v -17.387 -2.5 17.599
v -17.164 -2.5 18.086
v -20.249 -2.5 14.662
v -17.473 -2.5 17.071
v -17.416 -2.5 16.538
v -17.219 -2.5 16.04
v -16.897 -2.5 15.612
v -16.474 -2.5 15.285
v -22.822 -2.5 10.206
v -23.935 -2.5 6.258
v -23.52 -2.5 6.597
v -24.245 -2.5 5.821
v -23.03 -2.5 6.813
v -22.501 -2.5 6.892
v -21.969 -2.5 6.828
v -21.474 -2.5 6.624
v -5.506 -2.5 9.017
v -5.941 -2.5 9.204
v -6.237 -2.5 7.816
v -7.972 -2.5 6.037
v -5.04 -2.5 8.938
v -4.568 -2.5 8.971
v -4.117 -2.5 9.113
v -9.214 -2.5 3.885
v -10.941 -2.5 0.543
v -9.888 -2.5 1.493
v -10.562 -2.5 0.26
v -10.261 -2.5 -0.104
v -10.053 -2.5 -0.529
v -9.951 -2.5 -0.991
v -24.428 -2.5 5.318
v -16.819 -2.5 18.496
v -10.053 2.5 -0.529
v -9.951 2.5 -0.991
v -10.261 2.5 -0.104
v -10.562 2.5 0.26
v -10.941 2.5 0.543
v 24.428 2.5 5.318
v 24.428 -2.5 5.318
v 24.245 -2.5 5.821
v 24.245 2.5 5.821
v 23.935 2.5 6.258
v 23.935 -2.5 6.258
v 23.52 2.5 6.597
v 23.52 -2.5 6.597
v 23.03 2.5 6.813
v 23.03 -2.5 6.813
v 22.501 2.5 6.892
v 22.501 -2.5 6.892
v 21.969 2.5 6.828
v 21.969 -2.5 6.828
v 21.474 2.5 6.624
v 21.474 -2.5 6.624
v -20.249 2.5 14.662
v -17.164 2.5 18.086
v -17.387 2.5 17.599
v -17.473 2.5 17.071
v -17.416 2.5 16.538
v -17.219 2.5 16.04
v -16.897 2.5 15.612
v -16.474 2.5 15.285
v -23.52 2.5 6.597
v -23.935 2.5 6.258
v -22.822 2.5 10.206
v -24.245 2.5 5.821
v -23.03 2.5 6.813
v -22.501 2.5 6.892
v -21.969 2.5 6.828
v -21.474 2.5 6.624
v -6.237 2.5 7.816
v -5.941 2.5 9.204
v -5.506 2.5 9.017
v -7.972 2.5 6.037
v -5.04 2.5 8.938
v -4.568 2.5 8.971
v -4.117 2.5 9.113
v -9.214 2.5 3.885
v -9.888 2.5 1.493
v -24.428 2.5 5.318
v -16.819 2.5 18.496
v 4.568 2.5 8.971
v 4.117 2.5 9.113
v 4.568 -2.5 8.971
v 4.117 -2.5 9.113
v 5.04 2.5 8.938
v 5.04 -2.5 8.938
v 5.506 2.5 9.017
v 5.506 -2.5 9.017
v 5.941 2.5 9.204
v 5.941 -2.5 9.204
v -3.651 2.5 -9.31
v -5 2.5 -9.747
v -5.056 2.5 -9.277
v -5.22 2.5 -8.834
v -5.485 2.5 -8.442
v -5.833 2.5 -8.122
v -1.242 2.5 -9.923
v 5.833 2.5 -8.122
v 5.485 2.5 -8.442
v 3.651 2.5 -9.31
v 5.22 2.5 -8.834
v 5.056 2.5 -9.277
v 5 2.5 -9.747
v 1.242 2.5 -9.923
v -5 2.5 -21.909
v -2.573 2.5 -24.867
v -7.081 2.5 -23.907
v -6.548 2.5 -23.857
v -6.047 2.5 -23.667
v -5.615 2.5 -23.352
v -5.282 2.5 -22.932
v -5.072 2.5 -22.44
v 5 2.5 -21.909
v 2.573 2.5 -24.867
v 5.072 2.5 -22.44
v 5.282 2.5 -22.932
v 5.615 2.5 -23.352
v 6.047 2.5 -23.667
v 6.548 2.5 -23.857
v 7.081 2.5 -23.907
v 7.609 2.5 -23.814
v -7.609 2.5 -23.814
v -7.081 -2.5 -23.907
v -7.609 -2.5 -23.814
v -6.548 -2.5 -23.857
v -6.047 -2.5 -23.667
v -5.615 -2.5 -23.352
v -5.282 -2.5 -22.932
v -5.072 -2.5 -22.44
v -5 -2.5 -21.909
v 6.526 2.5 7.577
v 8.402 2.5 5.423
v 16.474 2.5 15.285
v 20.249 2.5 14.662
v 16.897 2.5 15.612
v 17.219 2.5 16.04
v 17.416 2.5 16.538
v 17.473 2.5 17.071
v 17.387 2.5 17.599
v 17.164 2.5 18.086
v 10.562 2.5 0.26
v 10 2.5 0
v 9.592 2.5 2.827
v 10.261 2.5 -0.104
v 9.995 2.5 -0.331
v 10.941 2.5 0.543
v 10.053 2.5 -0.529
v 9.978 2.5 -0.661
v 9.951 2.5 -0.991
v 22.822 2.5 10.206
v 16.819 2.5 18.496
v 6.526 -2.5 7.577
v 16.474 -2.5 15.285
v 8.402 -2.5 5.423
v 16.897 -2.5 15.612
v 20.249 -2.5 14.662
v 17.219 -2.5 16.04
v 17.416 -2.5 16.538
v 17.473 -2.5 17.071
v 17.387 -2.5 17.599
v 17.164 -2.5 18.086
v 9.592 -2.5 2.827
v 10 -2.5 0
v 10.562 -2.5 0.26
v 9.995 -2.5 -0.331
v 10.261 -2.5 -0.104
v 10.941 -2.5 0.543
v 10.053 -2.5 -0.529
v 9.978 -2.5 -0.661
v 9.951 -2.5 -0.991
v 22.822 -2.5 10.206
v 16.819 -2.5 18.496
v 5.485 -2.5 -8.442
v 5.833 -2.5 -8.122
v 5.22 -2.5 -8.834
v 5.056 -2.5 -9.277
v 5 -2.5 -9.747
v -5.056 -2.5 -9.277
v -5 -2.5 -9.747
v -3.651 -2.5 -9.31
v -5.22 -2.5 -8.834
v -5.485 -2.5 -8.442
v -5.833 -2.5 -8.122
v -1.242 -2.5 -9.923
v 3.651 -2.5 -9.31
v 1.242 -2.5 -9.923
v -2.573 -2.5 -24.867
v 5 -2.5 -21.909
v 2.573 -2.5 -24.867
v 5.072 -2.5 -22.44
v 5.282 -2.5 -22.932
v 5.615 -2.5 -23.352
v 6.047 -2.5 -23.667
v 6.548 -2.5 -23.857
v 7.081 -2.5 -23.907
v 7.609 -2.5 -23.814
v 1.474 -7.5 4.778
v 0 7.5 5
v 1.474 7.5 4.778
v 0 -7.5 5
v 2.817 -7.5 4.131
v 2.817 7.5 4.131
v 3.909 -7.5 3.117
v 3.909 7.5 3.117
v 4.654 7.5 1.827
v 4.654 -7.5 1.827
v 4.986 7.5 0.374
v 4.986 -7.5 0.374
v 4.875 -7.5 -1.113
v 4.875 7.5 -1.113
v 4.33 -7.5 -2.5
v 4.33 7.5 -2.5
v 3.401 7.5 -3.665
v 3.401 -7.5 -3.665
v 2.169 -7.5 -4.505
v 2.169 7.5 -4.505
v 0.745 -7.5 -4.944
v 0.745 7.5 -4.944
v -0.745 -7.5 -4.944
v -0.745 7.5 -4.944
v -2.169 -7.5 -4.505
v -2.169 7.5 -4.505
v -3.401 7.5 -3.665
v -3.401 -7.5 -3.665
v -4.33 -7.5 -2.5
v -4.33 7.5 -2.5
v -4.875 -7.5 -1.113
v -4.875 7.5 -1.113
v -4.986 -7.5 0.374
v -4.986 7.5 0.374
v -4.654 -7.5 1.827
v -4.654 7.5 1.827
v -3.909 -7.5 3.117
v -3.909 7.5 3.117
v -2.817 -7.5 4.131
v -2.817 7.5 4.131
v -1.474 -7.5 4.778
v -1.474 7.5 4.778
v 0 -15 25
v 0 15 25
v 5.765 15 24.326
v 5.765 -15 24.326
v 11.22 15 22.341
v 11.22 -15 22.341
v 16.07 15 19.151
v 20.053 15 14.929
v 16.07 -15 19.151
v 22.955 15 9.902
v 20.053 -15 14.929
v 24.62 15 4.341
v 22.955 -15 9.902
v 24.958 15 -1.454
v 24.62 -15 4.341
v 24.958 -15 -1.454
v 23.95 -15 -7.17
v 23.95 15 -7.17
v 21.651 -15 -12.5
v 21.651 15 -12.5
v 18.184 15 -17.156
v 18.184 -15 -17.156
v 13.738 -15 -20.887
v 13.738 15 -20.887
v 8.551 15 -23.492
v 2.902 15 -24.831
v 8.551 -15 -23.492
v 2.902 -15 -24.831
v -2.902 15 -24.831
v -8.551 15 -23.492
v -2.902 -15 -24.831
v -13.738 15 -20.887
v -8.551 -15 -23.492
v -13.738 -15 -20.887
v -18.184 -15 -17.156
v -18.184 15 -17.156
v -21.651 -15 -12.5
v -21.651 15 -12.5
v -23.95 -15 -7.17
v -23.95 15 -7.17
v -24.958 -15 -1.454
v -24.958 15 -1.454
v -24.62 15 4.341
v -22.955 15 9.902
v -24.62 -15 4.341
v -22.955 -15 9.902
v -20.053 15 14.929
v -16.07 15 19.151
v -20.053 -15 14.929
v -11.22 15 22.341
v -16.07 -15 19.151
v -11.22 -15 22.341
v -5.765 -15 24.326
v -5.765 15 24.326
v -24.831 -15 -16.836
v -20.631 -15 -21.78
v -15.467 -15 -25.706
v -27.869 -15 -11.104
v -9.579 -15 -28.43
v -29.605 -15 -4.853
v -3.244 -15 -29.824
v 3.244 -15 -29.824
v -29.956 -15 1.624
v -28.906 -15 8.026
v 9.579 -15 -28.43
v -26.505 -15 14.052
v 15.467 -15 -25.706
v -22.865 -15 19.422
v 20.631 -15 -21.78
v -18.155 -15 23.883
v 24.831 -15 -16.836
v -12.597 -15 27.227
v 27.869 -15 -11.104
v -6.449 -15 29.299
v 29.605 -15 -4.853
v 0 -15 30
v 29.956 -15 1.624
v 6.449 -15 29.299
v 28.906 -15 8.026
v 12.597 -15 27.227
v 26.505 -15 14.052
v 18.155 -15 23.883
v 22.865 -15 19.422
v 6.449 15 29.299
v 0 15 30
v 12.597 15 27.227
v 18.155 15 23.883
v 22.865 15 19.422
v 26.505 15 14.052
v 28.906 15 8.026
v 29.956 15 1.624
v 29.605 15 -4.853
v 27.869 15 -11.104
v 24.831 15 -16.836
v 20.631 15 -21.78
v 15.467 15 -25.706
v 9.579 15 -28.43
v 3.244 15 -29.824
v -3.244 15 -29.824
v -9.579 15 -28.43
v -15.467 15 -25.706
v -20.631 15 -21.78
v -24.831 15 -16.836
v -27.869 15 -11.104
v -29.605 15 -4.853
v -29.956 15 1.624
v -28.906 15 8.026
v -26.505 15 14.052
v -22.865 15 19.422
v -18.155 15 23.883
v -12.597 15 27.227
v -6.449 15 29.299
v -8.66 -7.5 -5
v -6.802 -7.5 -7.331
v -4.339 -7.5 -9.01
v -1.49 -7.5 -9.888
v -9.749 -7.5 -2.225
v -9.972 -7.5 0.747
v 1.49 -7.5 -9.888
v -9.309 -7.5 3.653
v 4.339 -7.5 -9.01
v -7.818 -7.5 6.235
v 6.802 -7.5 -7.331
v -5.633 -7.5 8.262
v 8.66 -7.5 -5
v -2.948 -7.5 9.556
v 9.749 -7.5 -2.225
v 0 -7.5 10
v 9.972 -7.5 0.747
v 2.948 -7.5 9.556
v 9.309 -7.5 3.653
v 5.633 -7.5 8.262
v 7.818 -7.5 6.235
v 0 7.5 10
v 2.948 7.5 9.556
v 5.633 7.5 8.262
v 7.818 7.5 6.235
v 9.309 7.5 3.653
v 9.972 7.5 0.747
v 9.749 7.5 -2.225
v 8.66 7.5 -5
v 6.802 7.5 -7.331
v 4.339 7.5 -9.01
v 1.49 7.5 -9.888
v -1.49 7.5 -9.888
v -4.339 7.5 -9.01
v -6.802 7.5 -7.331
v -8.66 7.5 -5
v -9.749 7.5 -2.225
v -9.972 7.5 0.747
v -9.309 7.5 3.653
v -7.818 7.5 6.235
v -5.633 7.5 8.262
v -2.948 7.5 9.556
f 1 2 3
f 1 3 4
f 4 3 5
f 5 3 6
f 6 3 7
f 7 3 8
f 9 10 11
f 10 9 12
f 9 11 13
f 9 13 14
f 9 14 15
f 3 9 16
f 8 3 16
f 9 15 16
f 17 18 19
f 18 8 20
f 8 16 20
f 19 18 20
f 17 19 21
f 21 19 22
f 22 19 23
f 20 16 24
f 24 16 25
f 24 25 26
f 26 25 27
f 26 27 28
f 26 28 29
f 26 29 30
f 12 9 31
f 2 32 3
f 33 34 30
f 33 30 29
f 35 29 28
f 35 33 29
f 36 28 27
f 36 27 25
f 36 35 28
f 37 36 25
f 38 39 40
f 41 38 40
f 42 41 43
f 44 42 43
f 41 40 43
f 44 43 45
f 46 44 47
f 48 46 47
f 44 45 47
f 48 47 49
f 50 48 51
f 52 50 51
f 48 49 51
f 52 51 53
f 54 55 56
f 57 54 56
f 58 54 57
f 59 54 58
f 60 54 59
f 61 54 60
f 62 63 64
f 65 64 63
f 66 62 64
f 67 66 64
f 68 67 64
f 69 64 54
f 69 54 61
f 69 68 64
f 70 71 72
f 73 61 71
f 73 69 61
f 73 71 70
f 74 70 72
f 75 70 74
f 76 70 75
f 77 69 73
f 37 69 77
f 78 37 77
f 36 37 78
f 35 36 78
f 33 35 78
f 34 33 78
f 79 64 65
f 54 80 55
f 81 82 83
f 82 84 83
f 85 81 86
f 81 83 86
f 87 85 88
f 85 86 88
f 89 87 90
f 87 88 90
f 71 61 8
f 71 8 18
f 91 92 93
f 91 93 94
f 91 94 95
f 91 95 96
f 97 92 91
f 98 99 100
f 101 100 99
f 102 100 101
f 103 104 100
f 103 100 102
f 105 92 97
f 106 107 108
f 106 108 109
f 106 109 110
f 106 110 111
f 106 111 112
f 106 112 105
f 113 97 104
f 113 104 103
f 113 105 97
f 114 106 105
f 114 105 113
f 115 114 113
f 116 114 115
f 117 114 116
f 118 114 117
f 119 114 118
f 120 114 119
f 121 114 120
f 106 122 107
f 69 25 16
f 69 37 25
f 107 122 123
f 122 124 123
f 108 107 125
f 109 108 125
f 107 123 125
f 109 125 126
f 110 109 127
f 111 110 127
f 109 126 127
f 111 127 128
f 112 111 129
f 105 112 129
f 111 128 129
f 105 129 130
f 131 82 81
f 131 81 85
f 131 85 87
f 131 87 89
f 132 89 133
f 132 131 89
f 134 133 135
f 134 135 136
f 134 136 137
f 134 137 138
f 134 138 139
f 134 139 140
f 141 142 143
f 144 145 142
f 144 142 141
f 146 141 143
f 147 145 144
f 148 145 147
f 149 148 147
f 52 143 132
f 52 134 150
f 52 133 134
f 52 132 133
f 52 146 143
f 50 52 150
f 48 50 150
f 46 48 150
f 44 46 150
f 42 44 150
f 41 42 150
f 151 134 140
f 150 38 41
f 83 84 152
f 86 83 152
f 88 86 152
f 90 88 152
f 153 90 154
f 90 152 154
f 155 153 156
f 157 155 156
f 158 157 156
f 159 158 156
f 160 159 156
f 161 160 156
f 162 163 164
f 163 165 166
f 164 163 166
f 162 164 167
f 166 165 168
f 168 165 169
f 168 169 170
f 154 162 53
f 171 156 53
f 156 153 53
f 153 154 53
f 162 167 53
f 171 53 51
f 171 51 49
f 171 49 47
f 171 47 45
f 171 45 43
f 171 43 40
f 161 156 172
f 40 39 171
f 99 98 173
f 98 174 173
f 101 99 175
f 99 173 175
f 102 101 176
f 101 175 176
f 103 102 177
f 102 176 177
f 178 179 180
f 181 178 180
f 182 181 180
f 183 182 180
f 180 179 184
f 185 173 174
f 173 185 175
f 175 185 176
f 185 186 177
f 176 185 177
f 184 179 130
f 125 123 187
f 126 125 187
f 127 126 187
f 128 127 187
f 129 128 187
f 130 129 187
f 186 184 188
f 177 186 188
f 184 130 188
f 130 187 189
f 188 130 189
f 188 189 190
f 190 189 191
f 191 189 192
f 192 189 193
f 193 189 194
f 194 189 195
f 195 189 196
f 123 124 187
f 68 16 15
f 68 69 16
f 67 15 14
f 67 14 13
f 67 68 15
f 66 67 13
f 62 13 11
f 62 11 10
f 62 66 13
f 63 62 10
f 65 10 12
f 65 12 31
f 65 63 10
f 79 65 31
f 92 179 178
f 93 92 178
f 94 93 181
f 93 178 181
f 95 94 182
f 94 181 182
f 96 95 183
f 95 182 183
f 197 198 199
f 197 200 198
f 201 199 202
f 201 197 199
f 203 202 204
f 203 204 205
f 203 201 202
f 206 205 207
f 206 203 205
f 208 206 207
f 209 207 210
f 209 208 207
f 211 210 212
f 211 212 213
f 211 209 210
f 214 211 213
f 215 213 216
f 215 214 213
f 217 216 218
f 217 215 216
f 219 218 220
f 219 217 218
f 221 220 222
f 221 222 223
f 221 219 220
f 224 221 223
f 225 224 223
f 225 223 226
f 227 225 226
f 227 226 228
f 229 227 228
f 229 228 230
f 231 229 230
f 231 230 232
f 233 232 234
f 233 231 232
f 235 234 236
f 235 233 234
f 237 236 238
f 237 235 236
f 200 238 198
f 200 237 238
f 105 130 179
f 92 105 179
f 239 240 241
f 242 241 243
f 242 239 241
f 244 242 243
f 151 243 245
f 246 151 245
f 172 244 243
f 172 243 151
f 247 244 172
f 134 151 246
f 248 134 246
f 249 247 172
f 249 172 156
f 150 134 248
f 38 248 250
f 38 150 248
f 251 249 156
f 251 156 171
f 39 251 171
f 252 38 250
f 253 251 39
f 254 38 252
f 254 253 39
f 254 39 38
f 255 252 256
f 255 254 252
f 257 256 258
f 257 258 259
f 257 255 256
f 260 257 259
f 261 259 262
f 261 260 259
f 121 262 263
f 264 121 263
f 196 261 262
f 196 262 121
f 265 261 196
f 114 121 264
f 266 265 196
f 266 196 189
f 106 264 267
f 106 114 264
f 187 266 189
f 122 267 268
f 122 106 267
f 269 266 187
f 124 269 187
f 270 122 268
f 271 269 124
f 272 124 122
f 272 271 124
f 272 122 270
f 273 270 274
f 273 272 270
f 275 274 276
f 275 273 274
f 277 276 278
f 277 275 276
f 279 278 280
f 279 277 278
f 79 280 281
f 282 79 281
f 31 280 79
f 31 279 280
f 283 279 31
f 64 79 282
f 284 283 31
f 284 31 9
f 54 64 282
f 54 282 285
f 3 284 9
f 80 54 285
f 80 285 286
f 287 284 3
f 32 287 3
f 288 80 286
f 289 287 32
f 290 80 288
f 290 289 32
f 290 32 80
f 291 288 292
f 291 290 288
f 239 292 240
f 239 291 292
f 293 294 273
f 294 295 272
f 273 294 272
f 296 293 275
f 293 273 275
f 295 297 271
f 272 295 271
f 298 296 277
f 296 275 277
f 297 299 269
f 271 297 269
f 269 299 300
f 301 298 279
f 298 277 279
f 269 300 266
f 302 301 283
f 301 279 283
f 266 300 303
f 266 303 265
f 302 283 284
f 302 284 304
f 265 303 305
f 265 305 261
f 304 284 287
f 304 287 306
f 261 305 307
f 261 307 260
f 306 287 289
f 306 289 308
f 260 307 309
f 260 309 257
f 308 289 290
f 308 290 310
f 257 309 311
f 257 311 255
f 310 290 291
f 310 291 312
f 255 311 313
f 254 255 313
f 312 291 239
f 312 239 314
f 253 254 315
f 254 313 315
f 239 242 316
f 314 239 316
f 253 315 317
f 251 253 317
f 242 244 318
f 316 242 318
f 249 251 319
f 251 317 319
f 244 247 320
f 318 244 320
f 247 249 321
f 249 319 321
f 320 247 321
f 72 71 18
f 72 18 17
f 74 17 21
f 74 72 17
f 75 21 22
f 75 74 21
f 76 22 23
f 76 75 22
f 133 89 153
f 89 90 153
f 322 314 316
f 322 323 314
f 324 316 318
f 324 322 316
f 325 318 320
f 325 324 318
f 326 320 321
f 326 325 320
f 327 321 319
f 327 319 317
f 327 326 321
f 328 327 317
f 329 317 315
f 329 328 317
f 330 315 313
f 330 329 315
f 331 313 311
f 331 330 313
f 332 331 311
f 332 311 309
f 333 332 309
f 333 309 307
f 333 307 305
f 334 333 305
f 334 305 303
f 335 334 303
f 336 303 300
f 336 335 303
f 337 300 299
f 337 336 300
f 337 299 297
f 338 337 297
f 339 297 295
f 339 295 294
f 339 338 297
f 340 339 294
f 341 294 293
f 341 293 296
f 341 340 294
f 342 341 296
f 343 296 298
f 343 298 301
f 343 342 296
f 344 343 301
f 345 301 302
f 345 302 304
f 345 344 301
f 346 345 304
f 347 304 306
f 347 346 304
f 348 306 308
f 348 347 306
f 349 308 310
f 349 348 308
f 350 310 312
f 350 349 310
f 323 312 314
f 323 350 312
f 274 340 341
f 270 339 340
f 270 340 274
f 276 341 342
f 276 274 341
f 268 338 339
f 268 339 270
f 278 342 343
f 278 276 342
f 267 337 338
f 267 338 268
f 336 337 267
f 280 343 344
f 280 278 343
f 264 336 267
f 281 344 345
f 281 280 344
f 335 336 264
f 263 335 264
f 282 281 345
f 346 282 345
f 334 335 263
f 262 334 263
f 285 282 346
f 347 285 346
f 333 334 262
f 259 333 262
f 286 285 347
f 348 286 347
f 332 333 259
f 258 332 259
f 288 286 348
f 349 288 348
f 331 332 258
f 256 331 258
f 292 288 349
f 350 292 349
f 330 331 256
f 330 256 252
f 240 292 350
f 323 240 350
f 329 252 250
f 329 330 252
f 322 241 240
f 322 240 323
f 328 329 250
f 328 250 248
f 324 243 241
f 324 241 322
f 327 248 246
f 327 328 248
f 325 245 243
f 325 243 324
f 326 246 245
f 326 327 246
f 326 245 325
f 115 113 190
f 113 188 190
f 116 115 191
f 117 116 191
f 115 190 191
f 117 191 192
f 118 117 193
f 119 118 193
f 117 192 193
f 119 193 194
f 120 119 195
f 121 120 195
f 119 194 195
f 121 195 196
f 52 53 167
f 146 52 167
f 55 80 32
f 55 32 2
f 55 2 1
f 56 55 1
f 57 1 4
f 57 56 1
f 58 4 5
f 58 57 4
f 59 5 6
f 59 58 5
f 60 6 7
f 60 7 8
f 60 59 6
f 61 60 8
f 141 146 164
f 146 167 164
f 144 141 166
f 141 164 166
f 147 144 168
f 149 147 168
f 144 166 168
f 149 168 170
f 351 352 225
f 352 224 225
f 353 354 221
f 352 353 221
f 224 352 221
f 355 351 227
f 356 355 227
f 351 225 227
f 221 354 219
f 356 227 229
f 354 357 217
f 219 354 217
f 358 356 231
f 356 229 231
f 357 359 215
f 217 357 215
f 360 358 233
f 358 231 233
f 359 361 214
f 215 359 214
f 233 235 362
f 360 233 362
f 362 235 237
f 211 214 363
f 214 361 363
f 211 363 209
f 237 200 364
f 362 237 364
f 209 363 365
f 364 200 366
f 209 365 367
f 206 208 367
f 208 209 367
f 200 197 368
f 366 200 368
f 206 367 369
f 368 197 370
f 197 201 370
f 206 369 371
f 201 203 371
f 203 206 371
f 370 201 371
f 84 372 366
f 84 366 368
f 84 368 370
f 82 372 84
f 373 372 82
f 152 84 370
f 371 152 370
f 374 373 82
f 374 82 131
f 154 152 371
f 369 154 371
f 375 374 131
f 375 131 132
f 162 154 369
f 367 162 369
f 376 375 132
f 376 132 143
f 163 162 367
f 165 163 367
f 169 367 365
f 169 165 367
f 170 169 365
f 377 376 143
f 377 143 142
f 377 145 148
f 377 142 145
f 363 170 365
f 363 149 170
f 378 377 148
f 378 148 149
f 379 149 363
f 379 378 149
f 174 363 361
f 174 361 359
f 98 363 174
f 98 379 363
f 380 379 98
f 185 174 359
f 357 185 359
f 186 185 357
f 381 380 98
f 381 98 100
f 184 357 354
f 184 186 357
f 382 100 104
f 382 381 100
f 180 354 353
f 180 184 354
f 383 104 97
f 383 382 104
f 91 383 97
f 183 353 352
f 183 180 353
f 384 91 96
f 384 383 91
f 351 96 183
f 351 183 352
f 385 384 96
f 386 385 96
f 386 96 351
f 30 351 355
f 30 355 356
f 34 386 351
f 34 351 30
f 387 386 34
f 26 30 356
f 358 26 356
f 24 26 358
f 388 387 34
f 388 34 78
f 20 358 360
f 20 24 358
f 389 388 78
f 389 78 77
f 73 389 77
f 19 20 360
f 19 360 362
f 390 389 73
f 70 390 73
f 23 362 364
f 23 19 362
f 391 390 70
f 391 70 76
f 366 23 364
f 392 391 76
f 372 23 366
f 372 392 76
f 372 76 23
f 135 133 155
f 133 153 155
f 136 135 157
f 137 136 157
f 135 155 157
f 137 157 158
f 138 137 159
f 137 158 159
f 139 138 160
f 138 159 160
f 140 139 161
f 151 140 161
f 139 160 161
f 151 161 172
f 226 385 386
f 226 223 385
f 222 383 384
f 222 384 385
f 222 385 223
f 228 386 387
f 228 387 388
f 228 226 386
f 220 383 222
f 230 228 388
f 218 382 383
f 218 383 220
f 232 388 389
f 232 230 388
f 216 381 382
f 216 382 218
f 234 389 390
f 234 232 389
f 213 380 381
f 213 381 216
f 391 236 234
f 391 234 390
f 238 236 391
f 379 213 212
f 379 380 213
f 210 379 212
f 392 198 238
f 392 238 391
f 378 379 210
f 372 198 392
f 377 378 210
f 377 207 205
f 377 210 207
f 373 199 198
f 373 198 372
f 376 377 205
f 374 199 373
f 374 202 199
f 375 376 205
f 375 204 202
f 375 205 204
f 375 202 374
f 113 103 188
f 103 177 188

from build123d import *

# Parameters (mm, degrees)
SKETCH1_R           = 30
BOSS_EXTRUDE1_DEPTH = 15
SKETCH1_3_R         = 5
BOSS_EXTRUDE2_DEPTH = 7.5
BOSS_EXTRUDE3_DEPTH = 2.5


with BuildPart() as part:
    # Sketch1 → Boss-Extrude1 (new, symmetric)
    with BuildSketch(Plane(origin=(0, 0, 0), x_dir=(1, 0, 0), z_dir=(0, 1, 0))):
        Circle(SKETCH1_R)
        with BuildLine():
            ThreePointArc((25, 0), (24.856562962, -2.674187298), (24.427897784, -5.317688395))
            ThreePointArc((24.427897784, -5.317688395), (21.650635095, -12.5), (16.819202132, -18.496335844))
            ThreePointArc((16.819202132, -18.496335844), (0, -25), (-16.819202132, -18.496335844))
            ThreePointArc((-16.819202132, -18.496335844), (-21.650635095, -12.5), (-24.427897784, -5.317688395))
            ThreePointArc((-24.427897784, -5.317688395), (-21.650635095, 12.5), (-7.608695652, 23.814024239))
            ThreePointArc((-7.608695652, 23.814024239), (0, 25), (7.608695652, 23.814024239))
            ThreePointArc((7.608695652, 23.814024239), (20.189321327, 14.744195615), (25, 0))
        make_face(mode=Mode.SUBTRACT)
    extrude(amount=BOSS_EXTRUDE1_DEPTH, both=True)



with BuildPart() as body_2:
    # Sketch1<3> → Boss-Extrude2 (new, symmetric)
    with BuildSketch(Plane(origin=(0, 0, 0), x_dir=(1, 0, 0), z_dir=(0, 1, 0))):
        with BuildLine():
            ThreePointArc((10, 0), (9.987694827, 0.49593553), (9.95080959, 0.990650545))
            ThreePointArc((9.95080959, 0.990650545), (8.660254038, 5), (5.833333333, 8.122328621))
            ThreePointArc((5.833333333, 8.122328621), (0, 10), (-5.833333333, 8.122328621))
            ThreePointArc((-5.833333333, 8.122328621), (-8.660254038, 5), (-9.95080959, 0.990650545))
            ThreePointArc((-9.95080959, 0.990650545), (-8.660254038, -5), (-4.117476257, -9.112979166))
            ThreePointArc((-4.117476257, -9.112979166), (0, -10), (4.117476257, -9.112979166))
            ThreePointArc((4.117476257, -9.112979166), (8.40162968, -5.423340181), (10, 0))
        make_face()
        Circle(SKETCH1_3_R, mode=Mode.SUBTRACT)
    extrude(amount=BOSS_EXTRUDE2_DEPTH, both=True)


with BuildPart() as part_1:
    add(part.part)

    add(body_2.part)  # Boss-Extrude3 merges body 2
    # Sketch1<4> → Boss-Extrude3 (add, symmetric)
    with BuildSketch(Plane(origin=(0, 0, 0), x_dir=(1, 0, 0), z_dir=(0, 1, 0))):
        with BuildLine():
            Line((21.473665961, -6.624324131), (10.940971508, -0.543270153))
            ThreePointArc((10.940971508, -0.543270153), (10.260645572, 0.104112618), (9.95080959, 0.990650545))
            ThreePointArc((9.95080959, 0.990650545), (8.660254038, -5), (4.117476257, -9.112979166))
            ThreePointArc((4.117476257, -9.112979166), (5.040158614, -8.938036034), (5.940971508, -9.203524191))
            Line((5.940971508, -9.203524191), (16.473665961, -15.284578169))
            ThreePointArc((16.473665961, -15.284578169), (17.462190998, -16.802693993), (16.819202132, -18.496335844))
            ThreePointArc((16.819202132, -18.496335844), (21.650635095, -12.5), (24.427897784, -5.317688395))
            ThreePointArc((24.427897784, -5.317688395), (23.282655349, -6.721354014), (21.473665961, -6.624324131))
        make_face()
        with BuildLine():
            ThreePointArc((-5.833333333, 8.122328621), (0, 10), (5.833333333, 8.122328621))
            ThreePointArc((5.833333333, 8.122328621), (5.220486958, 8.833923416), (5, 9.746794345))
            Line((5, 9.746794345), (5, 21.9089023))
            ThreePointArc((5, 21.9089023), (5.820464351, 23.524048006), (7.608695652, 23.814024239))
            ThreePointArc((7.608695652, 23.814024239), (0, 25), (-7.608695652, 23.814024239))
            ThreePointArc((-7.608695652, 23.814024239), (-5.820464351, 23.524048006), (-5, 21.9089023))
            Line((-5, 21.9089023), (-5, 9.746794345))
            ThreePointArc((-5, 9.746794345), (-5.220486958, 8.833923416), (-5.833333333, 8.122328621))
        make_face()
        with BuildLine():
            ThreePointArc((-24.427897784, -5.317688395), (-21.650635095, -12.5), (-16.819202132, -18.496335844))
            ThreePointArc((-16.819202132, -18.496335844), (-17.462190998, -16.802693993), (-16.473665961, -15.284578169))
            Line((-16.473665961, -15.284578169), (-5.940971508, -9.203524191))
            ThreePointArc((-5.940971508, -9.203524191), (-5.040158614, -8.938036034), (-4.117476257, -9.112979166))
            ThreePointArc((-4.117476257, -9.112979166), (-8.660254038, -5), (-9.95080959, 0.990650545))
            ThreePointArc((-9.95080959, 0.990650545), (-10.260645572, 0.104112618), (-10.940971508, -0.543270153))
            Line((-10.940971508, -0.543270153), (-21.473665961, -6.624324131))
            ThreePointArc((-21.473665961, -6.624324131), (-23.282655349, -6.721354014), (-24.427897784, -5.317688395))
        make_face()
    extrude(amount=BOSS_EXTRUDE3_DEPTH, both=True)


solid = part_1.part
